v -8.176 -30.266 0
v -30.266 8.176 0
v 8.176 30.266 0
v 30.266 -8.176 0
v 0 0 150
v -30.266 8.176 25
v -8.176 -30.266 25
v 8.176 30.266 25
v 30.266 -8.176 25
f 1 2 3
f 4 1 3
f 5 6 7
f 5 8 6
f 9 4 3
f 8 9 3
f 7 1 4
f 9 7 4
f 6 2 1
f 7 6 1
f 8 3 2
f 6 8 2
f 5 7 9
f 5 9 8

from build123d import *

# Parameters (mm, degrees)
F1_DEPTH = 25


with BuildPart() as f1:
    # F0 (on Top) → F1 (new body)
    with BuildSketch(Plane.XY):
        Polygon((30.266396, -8.176231), (8.176231, 30.266396), (-30.266396, 8.176231), (-8.176231, -30.266396), align=None)
    extrude(amount=F1_DEPTH)

    # F1_face (on face) → F4 section 0
    with BuildSketch(Plane.XY.offset(25), mode=Mode.PRIVATE) as f4_s0:
        Polygon((-8.176231, -30.266396), (30.266396, -8.176231), (8.176231, 30.266396), (-30.266396, 8.176231), align=None)
    loft([f4_s0.sketch, Vertex(0, 0, 150)])


solid = f1.part
